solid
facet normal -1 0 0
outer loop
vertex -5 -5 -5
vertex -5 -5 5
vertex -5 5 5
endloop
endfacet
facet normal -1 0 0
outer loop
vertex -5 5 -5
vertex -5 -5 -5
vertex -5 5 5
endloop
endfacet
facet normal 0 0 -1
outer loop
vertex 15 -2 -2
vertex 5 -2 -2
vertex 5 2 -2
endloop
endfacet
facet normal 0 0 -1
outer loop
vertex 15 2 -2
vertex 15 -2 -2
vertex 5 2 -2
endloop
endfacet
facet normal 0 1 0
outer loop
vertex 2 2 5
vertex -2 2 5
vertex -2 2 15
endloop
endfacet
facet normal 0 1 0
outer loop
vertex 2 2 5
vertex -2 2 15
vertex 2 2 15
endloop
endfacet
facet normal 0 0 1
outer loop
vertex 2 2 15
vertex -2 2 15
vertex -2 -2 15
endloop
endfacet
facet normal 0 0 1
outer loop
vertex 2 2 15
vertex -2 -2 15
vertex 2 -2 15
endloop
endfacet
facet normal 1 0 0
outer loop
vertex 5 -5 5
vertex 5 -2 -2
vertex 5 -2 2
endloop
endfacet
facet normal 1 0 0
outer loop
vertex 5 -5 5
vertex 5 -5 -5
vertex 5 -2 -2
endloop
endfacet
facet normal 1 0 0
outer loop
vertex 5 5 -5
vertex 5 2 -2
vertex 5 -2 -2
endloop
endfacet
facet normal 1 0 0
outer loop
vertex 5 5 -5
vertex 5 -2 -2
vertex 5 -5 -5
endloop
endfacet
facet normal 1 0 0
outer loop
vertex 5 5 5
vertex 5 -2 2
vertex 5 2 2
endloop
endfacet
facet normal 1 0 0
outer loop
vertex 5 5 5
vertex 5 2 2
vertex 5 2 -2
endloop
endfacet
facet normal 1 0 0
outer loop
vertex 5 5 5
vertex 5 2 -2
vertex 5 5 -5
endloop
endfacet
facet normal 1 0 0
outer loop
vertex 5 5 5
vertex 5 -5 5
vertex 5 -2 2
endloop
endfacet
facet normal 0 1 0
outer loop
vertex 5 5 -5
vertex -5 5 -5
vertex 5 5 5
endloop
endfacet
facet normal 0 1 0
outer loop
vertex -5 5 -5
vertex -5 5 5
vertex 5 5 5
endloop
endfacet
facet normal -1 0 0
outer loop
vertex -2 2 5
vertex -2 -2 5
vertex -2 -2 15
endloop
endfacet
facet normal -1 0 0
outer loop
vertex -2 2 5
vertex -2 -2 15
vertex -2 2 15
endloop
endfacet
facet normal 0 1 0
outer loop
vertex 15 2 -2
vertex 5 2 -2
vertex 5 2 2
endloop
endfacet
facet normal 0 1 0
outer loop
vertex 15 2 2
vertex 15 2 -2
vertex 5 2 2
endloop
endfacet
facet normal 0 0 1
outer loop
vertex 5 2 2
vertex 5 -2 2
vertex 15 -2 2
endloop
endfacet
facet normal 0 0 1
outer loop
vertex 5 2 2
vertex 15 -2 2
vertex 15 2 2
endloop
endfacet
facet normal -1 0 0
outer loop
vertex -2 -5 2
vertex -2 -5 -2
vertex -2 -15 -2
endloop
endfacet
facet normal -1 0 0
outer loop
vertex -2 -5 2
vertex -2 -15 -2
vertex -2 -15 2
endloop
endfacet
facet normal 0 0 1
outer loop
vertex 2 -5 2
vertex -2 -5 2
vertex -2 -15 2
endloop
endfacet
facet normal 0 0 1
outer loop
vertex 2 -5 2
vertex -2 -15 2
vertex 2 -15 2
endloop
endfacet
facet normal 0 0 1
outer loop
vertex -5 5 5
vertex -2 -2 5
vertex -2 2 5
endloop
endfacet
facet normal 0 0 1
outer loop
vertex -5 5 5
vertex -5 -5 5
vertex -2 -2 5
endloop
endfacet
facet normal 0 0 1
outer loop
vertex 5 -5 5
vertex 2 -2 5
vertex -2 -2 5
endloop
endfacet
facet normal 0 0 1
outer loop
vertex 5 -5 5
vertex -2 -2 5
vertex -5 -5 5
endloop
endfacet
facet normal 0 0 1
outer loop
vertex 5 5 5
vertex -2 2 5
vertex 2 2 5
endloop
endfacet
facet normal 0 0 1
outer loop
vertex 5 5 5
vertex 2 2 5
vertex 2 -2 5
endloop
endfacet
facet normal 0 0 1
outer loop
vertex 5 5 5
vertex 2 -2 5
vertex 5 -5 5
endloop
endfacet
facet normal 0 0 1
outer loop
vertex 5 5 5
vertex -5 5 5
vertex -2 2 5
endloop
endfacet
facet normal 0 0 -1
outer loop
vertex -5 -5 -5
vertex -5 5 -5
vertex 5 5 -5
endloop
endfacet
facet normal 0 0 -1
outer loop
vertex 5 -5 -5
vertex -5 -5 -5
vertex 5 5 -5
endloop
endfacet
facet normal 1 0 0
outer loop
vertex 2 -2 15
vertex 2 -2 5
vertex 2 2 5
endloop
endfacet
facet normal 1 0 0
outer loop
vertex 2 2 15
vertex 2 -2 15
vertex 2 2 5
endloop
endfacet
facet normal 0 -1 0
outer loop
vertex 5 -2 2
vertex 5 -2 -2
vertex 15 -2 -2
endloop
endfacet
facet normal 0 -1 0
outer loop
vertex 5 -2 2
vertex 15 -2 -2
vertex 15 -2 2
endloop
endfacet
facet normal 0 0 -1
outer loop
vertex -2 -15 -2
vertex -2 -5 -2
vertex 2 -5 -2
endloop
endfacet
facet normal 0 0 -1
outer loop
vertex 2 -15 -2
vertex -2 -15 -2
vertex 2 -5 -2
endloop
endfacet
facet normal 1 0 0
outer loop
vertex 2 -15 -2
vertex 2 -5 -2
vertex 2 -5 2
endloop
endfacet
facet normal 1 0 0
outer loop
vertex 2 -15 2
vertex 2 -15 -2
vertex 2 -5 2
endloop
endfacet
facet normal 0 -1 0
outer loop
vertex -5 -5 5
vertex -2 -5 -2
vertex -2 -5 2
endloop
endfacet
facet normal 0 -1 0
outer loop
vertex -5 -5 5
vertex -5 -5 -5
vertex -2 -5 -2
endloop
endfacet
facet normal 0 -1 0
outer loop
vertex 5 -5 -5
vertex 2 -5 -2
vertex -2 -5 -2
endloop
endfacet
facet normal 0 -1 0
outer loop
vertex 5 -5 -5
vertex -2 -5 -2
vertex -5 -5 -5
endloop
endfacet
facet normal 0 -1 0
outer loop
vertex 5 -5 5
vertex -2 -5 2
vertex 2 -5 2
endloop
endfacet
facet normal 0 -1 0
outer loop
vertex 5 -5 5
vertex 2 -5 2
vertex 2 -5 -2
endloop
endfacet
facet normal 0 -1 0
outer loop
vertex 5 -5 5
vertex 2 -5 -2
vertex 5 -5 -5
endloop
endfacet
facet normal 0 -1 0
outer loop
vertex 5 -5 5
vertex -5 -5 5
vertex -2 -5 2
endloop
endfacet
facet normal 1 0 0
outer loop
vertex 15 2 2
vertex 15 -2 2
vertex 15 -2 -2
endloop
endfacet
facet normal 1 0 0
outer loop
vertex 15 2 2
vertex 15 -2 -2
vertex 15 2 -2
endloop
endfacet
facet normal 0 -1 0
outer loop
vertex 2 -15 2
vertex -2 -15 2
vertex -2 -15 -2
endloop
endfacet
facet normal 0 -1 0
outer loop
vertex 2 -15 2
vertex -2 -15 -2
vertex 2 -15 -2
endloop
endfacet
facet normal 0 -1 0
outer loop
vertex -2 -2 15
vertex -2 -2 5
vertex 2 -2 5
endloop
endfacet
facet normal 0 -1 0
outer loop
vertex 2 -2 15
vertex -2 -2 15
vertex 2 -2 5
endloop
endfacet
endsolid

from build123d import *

# Parameters (mm, degrees)
F0_W     = 10
F0_H     = 10
F1_DEPTH = 5
F2_W     = 4
F2_H     = 4
F3_DEPTH = 15
F4_W     = 4
F4_H     = 4
F5_DEPTH = 15
F6_W     = 4
F6_H     = 4
F7_DEPTH = 15


with BuildPart() as f1:
    # F0 (on Top) → F1 (new body, symmetric)
    with BuildSketch(Plane.XY):
        Rectangle(F0_W, F0_H)
    extrude(amount=F1_DEPTH, both=True)

    # F2 (on Top) → F3 (join)
    with BuildSketch(Plane.XY):
        Rectangle(F2_W, F2_H)
    extrude(amount=F3_DEPTH)

    # F4 (on Front) → F5 (join)
    with BuildSketch(Plane.XZ):
        Rectangle(F4_W, F4_H)
    extrude(amount=F5_DEPTH)

    # F6 (on Right) → F7 (join)
    with BuildSketch(Plane.YZ):
        Rectangle(F6_W, F6_H)
    extrude(amount=F7_DEPTH)


solid = f1.part
